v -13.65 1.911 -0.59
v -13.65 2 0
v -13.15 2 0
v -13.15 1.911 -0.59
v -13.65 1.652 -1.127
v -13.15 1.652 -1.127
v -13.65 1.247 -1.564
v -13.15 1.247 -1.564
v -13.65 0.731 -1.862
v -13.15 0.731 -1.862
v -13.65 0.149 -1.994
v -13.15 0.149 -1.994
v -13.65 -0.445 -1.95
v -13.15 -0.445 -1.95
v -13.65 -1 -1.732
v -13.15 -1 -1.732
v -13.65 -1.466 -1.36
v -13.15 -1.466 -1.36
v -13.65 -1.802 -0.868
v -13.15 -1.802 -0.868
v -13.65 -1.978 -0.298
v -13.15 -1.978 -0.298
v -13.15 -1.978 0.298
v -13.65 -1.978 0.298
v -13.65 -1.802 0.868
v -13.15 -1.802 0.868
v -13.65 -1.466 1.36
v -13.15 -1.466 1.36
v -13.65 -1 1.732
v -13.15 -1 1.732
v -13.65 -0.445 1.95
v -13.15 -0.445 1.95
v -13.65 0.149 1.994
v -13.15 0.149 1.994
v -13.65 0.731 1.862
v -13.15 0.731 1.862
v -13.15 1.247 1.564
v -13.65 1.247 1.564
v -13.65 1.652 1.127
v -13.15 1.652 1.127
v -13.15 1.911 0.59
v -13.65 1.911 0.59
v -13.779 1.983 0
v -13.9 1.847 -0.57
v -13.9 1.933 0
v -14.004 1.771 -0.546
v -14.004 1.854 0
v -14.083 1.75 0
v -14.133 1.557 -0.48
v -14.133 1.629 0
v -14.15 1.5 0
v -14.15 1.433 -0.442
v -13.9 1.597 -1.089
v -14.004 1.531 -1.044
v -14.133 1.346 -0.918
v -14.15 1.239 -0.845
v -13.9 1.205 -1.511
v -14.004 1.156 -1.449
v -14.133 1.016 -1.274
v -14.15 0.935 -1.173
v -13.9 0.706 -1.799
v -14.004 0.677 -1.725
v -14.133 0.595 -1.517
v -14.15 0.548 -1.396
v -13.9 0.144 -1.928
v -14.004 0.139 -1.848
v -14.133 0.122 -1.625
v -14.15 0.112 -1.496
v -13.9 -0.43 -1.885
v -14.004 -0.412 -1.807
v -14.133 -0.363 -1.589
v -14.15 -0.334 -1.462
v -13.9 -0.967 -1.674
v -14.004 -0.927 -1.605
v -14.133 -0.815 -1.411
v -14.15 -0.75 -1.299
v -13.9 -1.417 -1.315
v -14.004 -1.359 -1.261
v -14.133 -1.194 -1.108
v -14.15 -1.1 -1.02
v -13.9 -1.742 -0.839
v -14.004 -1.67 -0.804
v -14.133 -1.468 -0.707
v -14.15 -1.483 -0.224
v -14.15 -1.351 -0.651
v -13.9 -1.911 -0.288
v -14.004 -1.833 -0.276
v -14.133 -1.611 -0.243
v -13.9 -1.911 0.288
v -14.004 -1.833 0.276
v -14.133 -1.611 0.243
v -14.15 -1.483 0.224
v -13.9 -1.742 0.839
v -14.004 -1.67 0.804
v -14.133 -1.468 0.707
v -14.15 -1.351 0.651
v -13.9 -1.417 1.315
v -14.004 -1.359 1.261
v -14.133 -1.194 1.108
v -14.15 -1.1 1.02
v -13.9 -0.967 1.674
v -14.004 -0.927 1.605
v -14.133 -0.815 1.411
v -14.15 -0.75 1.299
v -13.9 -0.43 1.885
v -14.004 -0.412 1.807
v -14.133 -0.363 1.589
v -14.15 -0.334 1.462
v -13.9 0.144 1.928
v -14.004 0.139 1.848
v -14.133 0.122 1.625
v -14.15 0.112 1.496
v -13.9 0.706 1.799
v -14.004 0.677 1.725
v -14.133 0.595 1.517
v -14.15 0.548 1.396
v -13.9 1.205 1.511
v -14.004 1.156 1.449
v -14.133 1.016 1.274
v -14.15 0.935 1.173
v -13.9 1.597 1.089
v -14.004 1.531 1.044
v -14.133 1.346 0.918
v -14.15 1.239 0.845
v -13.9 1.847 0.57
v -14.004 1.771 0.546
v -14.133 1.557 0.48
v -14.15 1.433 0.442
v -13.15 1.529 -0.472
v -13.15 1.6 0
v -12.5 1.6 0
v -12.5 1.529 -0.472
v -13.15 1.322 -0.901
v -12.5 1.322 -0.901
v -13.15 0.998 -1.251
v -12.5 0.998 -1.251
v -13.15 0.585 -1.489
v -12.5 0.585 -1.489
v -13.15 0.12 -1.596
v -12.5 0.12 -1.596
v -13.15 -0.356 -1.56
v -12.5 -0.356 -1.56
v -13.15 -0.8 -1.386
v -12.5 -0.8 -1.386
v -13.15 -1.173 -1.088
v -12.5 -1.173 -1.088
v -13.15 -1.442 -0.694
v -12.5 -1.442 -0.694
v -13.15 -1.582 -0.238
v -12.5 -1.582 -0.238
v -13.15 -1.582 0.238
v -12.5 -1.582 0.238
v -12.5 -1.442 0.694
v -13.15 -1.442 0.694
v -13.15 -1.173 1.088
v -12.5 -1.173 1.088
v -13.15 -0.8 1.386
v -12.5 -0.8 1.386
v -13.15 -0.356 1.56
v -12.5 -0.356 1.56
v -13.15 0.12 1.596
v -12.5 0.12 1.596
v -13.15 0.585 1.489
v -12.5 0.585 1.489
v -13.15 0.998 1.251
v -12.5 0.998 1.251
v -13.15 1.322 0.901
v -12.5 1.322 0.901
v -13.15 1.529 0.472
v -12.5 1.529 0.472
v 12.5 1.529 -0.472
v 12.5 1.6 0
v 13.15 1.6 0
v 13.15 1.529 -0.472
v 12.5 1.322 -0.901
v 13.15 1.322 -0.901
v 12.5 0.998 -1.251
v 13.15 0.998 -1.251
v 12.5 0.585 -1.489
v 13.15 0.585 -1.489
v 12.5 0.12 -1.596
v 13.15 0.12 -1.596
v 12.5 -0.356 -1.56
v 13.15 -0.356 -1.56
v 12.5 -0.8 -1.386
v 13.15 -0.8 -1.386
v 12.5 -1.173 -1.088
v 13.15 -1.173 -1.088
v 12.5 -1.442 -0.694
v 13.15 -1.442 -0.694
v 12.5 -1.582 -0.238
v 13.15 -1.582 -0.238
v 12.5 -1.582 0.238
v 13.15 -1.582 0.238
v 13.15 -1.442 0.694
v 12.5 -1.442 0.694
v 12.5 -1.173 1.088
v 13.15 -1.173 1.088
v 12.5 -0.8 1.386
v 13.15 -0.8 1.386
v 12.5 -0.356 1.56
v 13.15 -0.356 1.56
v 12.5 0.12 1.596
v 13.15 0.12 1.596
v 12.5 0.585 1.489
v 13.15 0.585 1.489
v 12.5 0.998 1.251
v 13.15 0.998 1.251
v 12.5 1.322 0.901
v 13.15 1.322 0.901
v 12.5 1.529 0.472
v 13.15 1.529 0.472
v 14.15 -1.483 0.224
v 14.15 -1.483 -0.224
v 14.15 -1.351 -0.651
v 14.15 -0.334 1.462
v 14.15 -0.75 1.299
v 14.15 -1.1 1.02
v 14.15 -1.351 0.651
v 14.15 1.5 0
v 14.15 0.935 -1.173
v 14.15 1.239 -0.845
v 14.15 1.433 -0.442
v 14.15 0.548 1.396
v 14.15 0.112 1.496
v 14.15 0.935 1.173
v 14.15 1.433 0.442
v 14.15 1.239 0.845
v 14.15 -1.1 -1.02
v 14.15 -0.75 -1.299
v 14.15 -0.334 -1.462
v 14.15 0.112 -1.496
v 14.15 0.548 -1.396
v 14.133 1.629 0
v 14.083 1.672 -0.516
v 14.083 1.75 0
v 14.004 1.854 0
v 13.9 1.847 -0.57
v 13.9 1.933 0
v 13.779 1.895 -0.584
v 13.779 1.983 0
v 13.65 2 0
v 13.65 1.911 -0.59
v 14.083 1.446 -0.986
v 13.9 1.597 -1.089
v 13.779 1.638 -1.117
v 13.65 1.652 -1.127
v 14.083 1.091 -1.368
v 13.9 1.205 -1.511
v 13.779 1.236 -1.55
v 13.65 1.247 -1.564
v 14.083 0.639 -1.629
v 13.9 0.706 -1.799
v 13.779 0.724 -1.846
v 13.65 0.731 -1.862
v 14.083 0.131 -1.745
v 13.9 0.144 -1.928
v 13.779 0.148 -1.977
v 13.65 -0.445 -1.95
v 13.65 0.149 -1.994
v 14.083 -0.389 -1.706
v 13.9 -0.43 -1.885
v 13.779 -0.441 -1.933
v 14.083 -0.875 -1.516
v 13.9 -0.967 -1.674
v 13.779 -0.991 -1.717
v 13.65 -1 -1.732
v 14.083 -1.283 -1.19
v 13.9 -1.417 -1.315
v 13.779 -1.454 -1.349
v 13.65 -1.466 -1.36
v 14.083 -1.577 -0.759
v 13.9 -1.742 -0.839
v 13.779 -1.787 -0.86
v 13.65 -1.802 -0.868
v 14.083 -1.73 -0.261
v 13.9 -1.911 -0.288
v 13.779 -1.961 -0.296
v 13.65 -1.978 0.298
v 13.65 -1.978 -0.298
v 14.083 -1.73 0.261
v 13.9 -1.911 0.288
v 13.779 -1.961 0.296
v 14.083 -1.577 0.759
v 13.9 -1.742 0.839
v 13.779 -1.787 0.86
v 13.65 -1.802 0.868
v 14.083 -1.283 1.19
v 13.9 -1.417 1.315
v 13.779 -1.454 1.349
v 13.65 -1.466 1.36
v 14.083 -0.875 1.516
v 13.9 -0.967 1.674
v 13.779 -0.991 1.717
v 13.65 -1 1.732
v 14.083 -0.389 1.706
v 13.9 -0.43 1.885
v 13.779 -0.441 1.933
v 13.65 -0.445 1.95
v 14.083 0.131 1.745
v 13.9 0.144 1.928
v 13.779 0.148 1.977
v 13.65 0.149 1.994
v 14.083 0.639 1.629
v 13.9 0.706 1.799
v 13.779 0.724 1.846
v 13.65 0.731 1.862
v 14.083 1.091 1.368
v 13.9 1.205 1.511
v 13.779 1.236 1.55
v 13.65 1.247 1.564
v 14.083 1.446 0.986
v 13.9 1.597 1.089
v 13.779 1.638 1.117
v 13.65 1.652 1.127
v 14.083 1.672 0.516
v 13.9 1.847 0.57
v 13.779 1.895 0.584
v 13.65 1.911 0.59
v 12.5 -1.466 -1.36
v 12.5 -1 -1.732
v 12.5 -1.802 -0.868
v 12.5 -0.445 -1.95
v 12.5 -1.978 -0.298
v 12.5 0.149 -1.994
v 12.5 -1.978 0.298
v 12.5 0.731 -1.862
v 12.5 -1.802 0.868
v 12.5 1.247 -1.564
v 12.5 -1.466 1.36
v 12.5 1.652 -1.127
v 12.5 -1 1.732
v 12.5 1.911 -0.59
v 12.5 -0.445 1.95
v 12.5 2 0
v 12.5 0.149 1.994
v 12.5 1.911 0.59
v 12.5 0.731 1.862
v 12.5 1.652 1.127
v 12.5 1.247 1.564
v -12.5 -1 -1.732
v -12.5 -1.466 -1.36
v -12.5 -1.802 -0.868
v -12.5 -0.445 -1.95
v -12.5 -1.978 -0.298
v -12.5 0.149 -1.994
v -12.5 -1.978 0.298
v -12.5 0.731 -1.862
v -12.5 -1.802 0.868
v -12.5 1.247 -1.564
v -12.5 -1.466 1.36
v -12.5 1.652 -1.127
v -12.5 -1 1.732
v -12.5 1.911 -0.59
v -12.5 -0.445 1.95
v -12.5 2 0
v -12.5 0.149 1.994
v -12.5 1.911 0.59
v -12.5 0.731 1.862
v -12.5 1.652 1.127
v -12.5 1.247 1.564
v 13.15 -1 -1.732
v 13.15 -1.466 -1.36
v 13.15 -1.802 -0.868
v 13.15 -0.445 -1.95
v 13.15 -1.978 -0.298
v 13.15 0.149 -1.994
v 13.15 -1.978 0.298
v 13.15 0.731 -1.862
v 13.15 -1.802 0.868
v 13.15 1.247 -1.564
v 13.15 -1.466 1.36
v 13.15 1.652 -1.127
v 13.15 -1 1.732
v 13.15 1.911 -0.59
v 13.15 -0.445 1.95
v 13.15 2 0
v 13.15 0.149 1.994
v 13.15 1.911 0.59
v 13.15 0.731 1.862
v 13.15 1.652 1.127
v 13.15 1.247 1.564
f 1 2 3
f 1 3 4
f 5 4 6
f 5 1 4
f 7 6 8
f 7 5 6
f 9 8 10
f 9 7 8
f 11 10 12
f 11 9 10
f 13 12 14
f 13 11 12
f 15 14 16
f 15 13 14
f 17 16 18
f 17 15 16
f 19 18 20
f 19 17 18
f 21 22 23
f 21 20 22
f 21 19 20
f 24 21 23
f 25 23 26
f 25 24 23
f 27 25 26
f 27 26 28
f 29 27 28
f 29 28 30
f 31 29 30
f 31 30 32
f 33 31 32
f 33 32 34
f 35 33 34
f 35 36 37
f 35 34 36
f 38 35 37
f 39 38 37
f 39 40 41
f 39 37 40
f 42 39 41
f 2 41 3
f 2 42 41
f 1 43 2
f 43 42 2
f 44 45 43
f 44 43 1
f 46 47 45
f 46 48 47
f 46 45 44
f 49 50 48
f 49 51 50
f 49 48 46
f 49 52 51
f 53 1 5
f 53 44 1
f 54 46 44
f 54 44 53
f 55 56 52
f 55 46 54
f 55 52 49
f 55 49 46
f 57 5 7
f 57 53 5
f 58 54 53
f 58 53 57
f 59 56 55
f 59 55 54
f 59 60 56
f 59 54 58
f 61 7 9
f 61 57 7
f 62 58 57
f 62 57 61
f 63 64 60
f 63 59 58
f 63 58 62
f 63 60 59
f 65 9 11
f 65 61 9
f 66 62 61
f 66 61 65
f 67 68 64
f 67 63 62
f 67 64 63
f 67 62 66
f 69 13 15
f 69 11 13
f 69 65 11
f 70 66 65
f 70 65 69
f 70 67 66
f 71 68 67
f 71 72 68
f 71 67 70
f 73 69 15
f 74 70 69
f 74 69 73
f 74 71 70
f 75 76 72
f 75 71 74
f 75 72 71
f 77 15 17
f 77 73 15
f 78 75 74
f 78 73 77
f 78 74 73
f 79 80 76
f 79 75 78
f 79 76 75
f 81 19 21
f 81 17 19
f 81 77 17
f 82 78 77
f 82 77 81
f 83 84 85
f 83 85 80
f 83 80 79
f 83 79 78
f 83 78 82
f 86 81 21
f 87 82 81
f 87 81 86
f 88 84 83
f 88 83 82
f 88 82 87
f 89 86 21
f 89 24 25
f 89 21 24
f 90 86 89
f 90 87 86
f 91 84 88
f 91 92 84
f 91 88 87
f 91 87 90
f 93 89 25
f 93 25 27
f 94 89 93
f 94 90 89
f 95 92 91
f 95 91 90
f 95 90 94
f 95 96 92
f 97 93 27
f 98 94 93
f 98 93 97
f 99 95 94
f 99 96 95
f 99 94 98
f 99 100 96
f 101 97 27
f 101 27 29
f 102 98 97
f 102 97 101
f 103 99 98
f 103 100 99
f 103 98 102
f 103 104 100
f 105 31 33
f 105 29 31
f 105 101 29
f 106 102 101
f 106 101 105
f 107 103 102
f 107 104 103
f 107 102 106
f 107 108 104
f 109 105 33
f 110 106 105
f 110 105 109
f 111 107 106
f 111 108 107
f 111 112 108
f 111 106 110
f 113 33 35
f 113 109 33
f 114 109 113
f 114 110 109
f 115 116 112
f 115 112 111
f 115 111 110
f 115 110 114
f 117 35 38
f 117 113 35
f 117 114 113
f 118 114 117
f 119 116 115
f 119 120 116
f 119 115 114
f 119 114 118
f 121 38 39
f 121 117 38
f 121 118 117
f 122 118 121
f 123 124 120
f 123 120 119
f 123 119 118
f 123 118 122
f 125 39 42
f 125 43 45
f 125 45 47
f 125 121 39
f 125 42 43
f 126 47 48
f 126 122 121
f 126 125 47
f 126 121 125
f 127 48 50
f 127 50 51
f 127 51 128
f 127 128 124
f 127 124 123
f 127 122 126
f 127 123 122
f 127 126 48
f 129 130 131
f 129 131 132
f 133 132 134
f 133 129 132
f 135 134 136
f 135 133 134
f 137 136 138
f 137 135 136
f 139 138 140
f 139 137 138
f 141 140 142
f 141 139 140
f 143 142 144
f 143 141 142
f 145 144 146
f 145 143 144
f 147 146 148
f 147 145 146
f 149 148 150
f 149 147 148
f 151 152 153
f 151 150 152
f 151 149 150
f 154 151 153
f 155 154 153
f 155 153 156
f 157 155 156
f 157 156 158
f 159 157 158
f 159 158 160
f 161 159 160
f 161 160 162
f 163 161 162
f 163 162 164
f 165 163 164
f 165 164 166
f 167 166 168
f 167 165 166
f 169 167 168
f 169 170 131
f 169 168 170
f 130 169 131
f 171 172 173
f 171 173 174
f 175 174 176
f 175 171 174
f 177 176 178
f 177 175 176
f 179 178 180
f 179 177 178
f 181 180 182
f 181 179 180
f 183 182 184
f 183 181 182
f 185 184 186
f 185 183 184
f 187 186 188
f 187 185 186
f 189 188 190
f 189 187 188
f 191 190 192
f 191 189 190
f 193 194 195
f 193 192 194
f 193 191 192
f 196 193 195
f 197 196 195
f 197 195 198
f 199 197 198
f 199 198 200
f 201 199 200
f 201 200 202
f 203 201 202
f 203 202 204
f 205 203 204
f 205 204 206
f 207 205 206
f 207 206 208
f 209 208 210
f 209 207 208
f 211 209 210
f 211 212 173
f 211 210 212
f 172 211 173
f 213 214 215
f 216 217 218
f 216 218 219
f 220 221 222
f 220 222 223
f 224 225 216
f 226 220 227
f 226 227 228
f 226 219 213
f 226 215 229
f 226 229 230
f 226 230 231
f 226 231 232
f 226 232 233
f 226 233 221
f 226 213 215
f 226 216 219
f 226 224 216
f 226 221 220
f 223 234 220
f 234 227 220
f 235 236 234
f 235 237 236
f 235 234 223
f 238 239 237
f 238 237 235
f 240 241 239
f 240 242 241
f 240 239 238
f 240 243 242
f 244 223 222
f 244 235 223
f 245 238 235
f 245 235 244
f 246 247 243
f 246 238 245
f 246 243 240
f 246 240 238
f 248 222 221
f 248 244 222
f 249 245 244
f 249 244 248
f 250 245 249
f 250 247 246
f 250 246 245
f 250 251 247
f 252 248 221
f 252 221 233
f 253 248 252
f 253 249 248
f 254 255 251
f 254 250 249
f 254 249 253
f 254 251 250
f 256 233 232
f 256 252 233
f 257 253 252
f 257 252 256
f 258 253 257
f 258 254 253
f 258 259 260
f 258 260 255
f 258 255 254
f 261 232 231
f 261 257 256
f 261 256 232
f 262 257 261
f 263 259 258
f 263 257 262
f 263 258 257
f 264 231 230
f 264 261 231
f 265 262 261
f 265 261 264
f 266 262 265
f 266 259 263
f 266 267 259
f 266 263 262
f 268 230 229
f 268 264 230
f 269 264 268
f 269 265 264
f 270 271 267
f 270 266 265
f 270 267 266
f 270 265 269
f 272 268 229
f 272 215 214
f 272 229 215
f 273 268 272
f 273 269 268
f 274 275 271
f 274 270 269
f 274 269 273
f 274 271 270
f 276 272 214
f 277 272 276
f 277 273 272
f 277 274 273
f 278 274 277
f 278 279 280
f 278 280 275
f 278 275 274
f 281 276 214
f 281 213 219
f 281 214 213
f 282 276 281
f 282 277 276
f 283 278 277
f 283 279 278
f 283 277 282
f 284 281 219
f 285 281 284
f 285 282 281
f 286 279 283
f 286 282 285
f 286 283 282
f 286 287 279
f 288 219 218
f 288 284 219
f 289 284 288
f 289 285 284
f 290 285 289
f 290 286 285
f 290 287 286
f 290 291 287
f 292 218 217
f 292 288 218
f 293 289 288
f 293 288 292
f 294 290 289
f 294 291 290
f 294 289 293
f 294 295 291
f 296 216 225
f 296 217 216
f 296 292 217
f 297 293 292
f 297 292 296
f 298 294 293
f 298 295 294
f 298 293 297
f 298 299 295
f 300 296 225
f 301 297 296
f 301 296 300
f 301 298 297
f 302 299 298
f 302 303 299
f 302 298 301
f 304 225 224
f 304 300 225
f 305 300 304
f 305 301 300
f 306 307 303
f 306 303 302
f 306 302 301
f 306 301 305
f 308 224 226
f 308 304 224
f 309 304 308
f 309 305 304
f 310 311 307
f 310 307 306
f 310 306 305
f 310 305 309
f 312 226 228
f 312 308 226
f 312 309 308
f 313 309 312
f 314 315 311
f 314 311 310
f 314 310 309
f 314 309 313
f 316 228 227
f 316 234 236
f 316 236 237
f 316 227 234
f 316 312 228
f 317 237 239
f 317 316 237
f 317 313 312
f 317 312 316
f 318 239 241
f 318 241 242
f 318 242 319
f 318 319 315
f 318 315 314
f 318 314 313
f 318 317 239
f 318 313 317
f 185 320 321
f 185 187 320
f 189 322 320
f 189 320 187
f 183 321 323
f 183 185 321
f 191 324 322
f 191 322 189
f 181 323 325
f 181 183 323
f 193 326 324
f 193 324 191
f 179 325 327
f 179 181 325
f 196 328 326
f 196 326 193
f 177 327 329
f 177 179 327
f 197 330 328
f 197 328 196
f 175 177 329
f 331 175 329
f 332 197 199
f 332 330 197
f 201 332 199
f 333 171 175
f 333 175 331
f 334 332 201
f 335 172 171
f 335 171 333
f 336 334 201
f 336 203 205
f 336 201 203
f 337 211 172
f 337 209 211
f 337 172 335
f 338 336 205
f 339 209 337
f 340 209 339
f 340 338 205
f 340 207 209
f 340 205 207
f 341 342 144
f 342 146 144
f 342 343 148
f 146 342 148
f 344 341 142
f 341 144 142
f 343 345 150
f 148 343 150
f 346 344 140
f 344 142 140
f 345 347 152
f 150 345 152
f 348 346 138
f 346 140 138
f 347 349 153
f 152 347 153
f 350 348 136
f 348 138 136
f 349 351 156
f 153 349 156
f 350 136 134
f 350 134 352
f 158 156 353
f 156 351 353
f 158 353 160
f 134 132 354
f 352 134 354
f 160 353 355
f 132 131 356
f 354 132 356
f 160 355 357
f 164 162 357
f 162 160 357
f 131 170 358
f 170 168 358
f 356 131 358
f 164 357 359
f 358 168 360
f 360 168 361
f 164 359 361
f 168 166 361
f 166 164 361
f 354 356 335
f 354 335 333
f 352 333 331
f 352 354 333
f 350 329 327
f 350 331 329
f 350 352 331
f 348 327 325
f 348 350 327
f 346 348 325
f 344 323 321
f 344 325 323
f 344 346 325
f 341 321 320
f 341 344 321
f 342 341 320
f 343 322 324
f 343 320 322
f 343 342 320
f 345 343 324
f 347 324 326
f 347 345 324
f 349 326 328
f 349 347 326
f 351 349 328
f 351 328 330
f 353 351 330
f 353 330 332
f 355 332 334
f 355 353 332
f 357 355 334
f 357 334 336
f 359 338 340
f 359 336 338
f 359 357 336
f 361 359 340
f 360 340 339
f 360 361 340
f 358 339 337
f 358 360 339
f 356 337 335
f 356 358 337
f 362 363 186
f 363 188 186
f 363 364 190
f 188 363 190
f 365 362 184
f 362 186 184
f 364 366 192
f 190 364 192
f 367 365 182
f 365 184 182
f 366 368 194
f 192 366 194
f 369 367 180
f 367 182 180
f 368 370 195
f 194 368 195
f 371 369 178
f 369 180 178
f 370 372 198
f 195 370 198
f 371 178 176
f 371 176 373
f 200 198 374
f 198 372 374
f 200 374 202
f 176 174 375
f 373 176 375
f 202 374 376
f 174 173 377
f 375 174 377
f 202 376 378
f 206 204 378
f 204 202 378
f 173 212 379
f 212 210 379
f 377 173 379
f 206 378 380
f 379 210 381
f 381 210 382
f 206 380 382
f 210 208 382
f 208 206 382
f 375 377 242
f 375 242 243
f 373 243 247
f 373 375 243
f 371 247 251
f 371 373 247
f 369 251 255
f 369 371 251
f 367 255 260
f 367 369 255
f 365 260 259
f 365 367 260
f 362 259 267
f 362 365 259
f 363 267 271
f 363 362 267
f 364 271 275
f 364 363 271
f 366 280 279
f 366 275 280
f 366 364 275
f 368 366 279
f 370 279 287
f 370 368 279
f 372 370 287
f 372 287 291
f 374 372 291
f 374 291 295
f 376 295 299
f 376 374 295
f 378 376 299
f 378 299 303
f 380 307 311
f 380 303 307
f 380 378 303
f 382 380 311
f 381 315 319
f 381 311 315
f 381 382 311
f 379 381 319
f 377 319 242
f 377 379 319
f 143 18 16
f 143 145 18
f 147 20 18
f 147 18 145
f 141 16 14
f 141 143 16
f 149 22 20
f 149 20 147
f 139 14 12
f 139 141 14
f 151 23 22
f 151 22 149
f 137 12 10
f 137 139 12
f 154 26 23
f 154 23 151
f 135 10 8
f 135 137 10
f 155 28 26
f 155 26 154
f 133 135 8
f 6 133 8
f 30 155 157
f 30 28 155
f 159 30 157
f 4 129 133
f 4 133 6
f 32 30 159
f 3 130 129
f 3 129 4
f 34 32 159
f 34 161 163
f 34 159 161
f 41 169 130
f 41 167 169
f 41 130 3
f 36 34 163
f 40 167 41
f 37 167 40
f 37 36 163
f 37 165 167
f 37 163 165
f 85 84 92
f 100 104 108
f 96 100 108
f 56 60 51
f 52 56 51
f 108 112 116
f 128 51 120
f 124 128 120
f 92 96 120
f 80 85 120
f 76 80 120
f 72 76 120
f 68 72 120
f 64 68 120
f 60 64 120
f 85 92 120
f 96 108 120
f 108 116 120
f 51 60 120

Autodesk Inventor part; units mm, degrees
ref_plane "YZ Plane" through (0, 0, 0) normal (1, 0, 0) x (0, 1, 0)
ref_plane "XZ Plane" through (0, 0, 0) normal (0, 1, 0) x (-1, 0, 0)
ref_plane "XY Plane" through (0, 0, 0) normal (0, 0, 1) x (1, 0, 0)
sketch "Sketch1" plane through (0, 0, 0) normal (0, 0, 1) x (1, 0, 0)
  line L0 (-14.15, 0) -> (14.15, 0)
  line L1 (14.15, 0) -> (14.15, 1.5)
  line L2 (13.65, 2) -> (13.15, 2)
  line L3 (13.15, 2) -> (13.15, 1.6)
  line L4 (13.15, 1.6) -> (12.5, 1.6)
  line L5 (12.5, 1.6) -> (12.5, 2)
  line L6 (12.5, 2) -> (-12.5, 2)
  line L7 (-12.5, 2) -> (-12.5, 1.6)
  line L8 (-12.5, 1.6) -> (-13.15, 1.6)
  line L9 (-13.15, 1.6) -> (-13.15, 2)
  line L10 (-13.15, 2) -> (-13.65, 2)
  line L11 (-14.15, 1.5) -> (-14.15, 0)
  arc A0 (-13.65, 2) -> (-14.15, 1.5) centre (-13.65, 1.5) ccw
  arc A1 (14.15, 1.5) -> (13.65, 2) centre (13.65, 1.5) ccw
  point P0 (0, 0)
  point P1 (14.15, 2)
  point P2 (-14.15, 2)
  point P3 (0, 0)
  dimension "d0" = 25
  dimension "d1" = 0.65
  dimension "d2" = 1
  dimension "d3" = 2
  dimension "d4" = 1.6
  dimension "d5" = 1.6
  dimension "d6" = 0.5
  dimension "d7" = 1
  dimension "d8" = 0.5
revolve "Revolution1" add sketch "Sketch1" angle 360 about axis through (-14.15, 0, 0) along (1, 0, 0)
equation "\"d5\" = d4"
properties part number "Component 25 (Rocker Arm Axle)"
